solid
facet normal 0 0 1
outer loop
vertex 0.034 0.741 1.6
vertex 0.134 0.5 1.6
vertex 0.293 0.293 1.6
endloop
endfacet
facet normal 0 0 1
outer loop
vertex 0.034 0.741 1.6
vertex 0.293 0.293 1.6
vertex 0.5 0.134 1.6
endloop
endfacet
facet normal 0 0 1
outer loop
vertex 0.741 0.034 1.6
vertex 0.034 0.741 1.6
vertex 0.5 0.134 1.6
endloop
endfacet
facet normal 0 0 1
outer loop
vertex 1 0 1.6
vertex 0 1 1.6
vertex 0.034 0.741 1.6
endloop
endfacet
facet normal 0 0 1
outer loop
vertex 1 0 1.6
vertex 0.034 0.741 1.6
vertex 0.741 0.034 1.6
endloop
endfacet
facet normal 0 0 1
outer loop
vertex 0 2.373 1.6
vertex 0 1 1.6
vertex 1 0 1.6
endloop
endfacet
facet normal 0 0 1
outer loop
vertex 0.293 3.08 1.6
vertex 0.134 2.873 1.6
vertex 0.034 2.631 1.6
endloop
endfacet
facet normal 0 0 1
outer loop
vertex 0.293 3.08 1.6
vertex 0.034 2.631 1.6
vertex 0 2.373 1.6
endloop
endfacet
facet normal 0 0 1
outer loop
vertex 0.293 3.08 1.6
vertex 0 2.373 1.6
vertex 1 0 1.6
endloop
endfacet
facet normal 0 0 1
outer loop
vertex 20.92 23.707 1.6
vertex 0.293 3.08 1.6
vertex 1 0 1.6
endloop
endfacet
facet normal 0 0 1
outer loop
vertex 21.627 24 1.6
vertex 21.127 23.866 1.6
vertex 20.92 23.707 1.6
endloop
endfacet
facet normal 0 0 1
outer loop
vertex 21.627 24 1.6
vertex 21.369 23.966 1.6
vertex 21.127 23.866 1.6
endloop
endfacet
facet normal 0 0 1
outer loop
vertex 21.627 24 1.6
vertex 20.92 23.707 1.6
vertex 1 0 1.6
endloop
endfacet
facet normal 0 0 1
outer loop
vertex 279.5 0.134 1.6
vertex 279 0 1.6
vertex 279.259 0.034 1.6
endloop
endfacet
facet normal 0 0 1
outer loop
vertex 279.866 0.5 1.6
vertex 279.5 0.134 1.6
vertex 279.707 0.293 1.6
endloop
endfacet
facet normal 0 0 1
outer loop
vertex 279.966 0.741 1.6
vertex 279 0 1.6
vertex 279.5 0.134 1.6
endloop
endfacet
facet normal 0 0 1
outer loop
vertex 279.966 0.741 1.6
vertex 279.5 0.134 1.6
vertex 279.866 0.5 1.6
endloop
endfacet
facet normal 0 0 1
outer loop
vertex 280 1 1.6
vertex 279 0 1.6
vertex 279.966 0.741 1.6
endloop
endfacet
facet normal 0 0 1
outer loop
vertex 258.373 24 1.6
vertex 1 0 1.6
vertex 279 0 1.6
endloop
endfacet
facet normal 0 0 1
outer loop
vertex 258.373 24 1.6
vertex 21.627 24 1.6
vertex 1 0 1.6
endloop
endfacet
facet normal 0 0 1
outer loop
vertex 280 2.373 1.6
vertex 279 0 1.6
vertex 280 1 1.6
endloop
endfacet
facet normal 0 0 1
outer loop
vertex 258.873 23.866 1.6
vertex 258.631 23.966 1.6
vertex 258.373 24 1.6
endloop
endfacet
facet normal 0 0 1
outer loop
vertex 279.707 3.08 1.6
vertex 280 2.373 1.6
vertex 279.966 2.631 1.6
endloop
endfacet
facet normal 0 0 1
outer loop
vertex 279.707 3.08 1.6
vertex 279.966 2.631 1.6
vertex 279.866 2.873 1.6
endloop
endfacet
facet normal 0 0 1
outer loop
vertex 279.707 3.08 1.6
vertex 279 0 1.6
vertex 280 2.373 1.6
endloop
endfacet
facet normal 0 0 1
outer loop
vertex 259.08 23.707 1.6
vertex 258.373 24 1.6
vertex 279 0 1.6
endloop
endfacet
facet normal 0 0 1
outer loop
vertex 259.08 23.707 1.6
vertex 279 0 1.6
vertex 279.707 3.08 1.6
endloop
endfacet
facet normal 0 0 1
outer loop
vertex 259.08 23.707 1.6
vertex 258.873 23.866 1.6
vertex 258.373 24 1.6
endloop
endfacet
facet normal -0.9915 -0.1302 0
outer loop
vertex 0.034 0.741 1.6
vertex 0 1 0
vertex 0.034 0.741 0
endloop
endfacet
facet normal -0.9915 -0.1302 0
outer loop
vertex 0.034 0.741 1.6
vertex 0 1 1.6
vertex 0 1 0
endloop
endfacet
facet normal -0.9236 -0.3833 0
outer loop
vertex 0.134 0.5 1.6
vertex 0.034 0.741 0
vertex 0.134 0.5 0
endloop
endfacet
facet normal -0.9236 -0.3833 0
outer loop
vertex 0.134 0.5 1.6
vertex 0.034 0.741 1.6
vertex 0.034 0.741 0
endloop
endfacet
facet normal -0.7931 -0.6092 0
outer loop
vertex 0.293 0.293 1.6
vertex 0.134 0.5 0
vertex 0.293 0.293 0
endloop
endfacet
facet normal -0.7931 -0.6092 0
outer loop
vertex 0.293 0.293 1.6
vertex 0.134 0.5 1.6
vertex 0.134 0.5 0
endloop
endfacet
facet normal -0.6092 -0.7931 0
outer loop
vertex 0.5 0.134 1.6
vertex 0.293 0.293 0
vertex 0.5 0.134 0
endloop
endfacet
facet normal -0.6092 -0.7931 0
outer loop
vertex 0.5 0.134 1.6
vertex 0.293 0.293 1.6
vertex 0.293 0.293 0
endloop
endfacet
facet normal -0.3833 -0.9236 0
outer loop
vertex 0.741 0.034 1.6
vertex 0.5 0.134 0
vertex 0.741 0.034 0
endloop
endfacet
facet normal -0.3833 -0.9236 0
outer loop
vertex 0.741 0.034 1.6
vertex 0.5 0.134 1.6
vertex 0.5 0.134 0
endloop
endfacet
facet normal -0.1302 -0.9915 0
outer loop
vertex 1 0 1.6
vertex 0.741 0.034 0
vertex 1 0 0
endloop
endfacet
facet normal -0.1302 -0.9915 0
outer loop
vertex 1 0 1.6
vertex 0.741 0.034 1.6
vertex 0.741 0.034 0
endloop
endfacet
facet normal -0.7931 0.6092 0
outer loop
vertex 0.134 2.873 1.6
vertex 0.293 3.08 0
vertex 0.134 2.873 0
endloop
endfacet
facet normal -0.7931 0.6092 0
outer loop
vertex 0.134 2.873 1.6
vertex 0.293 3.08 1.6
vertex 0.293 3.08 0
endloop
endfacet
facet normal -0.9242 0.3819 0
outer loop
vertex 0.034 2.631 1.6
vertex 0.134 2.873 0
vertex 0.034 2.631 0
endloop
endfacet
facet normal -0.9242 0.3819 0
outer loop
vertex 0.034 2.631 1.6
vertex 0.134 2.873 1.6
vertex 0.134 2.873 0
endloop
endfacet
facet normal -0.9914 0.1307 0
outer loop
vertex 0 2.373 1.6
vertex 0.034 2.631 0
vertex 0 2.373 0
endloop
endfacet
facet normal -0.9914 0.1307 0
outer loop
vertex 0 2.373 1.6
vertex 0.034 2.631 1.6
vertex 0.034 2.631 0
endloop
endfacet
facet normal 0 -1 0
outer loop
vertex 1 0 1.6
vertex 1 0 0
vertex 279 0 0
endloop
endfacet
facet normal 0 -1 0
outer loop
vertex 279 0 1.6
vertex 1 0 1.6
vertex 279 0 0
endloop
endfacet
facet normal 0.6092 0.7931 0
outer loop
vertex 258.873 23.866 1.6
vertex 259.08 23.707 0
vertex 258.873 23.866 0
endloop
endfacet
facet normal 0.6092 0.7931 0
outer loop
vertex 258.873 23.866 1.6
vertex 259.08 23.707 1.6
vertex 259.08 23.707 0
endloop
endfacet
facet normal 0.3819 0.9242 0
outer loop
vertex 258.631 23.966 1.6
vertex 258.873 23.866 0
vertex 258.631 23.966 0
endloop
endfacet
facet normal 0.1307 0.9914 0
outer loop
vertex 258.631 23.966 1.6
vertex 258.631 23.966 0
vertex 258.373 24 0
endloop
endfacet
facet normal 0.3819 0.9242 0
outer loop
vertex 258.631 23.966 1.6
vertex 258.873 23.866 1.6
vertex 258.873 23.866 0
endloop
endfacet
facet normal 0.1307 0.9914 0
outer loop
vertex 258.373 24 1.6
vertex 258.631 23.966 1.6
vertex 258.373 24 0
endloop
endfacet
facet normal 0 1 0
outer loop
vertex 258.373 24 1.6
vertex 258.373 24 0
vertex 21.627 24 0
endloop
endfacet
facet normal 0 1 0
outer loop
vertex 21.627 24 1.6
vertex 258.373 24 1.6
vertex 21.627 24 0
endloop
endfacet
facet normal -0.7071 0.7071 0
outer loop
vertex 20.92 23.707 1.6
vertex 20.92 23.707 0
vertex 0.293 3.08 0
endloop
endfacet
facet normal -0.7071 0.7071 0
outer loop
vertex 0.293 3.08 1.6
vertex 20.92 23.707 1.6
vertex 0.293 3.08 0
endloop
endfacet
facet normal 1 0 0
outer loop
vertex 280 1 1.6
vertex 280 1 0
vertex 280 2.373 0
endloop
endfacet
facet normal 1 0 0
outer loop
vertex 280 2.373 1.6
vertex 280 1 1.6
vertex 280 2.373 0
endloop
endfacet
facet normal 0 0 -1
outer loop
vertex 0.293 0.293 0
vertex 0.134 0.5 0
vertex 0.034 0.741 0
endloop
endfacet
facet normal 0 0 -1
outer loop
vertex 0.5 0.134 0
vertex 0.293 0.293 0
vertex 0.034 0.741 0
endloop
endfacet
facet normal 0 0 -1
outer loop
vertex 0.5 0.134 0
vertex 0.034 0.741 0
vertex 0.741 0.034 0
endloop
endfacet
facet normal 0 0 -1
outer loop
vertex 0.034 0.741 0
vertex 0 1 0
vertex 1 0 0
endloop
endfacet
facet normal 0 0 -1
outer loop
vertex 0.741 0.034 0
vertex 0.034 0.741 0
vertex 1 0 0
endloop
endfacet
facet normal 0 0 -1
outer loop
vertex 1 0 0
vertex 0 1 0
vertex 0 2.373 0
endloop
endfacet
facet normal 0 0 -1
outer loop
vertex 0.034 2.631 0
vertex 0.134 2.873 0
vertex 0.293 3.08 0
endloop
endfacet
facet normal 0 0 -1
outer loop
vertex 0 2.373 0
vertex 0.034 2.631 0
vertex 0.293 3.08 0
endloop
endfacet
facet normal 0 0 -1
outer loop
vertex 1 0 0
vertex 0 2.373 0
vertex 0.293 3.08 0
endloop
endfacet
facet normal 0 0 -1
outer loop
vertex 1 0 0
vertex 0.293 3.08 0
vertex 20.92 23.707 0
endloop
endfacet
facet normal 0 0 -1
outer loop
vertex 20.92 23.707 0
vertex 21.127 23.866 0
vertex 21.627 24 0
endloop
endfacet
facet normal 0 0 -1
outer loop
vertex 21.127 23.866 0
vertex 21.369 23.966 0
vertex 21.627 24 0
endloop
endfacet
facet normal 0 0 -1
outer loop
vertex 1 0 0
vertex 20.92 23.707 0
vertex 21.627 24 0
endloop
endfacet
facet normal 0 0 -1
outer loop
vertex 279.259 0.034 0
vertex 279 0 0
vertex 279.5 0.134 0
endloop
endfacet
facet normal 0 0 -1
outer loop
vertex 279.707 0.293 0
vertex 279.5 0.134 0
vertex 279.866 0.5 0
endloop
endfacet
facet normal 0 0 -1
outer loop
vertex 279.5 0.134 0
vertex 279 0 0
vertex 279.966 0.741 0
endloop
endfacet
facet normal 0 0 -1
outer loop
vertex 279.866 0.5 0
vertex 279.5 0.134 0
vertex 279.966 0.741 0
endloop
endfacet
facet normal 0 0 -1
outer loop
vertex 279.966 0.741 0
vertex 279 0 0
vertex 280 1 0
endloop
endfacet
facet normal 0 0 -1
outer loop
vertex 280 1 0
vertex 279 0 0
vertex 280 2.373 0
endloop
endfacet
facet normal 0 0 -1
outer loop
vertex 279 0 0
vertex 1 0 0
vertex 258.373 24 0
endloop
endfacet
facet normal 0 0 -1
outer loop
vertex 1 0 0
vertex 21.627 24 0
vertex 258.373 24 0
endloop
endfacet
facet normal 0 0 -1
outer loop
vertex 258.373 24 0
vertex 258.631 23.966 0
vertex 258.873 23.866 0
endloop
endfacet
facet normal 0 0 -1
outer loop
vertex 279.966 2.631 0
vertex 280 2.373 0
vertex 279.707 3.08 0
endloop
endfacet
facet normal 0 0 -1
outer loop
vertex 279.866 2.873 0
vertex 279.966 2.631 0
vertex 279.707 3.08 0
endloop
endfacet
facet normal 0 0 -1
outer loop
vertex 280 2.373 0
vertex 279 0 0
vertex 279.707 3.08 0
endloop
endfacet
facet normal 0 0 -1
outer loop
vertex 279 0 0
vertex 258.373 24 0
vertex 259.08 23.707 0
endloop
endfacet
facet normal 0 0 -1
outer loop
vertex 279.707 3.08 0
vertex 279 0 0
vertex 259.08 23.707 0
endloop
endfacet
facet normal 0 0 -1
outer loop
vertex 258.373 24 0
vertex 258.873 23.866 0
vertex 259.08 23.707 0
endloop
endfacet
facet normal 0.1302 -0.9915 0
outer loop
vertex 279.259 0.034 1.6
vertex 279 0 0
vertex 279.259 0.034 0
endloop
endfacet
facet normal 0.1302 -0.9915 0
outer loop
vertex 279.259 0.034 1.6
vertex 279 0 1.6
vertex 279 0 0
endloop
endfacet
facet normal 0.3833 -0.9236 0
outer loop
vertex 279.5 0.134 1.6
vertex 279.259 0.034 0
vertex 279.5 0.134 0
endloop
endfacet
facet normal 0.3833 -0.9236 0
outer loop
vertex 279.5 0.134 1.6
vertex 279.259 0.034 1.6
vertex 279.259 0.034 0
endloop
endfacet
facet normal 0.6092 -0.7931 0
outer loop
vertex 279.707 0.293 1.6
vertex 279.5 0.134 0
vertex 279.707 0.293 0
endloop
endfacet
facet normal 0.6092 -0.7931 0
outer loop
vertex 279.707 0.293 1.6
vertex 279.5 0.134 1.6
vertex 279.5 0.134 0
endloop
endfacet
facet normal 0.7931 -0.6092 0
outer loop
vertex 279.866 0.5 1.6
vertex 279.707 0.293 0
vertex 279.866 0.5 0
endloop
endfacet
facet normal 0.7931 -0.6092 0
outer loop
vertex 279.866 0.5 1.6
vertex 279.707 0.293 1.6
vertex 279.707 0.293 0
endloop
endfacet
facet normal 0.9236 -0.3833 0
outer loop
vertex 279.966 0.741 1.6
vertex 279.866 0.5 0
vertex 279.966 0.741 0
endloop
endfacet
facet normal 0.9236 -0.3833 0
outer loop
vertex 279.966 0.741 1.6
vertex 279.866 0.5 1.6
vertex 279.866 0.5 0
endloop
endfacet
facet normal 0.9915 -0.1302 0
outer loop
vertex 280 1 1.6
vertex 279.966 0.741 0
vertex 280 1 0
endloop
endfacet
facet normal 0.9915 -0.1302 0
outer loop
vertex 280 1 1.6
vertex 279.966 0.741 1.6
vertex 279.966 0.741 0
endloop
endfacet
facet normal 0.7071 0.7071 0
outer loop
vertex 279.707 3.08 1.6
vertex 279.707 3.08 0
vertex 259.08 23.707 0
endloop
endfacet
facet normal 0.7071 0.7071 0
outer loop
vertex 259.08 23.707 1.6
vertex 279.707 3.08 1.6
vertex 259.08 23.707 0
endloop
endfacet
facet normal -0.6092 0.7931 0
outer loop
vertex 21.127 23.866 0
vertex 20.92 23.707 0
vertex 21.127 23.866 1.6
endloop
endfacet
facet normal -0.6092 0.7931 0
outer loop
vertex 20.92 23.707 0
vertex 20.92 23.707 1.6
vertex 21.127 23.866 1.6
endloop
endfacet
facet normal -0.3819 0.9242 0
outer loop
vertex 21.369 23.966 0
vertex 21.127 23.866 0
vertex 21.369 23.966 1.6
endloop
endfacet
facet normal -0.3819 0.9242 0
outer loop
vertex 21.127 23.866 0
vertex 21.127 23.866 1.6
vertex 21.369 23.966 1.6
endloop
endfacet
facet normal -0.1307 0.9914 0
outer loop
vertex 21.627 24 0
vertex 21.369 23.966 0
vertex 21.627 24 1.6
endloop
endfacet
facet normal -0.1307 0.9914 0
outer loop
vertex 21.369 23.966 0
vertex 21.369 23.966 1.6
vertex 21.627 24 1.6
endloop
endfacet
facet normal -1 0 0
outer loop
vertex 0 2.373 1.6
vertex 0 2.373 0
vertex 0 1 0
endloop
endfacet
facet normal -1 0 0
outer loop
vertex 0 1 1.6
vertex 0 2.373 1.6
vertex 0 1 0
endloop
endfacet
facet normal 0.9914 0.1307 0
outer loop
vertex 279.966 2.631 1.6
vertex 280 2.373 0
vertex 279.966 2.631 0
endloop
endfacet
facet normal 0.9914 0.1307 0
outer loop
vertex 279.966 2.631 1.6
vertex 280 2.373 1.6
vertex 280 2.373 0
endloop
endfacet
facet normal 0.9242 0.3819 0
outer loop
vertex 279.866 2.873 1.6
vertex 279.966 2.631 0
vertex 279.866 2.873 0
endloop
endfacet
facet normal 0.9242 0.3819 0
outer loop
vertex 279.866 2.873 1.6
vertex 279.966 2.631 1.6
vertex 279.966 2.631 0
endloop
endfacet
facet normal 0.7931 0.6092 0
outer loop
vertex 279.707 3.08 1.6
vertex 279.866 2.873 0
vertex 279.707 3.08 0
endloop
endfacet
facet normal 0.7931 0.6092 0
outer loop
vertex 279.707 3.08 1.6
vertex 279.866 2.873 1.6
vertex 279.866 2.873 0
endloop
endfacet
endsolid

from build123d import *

# Parameters (mm, degrees)
BOSS_EXTRUDE1_DEPTH = 1.6
FILLET1_R           = 1
BOSS_EXTRUDE2_DEPTH = 1.6


with BuildPart() as part:
    # Sketch1 → Boss-Extrude1 (new body)
    with BuildSketch(Plane.XY):
        with BuildLine():
            Line((21.213203436, 24), (0, 2.786796564))
            Line((0, 2.786796564), (0, 0))
            Line((0, 0), (42, 0))
            Line((42, 0), (42, 11))
            ThreePointArc((42, 11), (43.171572875, 13.828427125), (46, 15))
            Line((46, 15), (234, 15))
            ThreePointArc((234, 15), (236.828427125, 13.828427125), (238, 11))
            Line((238, 11), (238, 0))
            Line((238, 0), (280, 0))
            Line((280, 0), (280, 2.786796564))
            Line((280, 2.786796564), (258.786796564, 24))
            Line((258.786796564, 24), (21.213203436, 24))
        make_face()
    extrude(amount=BOSS_EXTRUDE1_DEPTH)

    # Fillet1
    fillet1_edges = [part.edges().sort_by_distance(p)[0] for p in [
        (0, 0, 0.8),
        (0, 2.786796564, 0.8),
        (21.213203436, 24, 0.8),
        (258.786796564, 24, 0.8),
        (280, 2.786796564, 0.8),
        (280, 0, 0.8),
    ]]
    fillet(fillet1_edges, radius=FILLET1_R)

    # Sketch1<3> → Boss-Extrude2 (add)
    with BuildSketch(Plane.XY):
        with BuildLine():
            Line((42, 11), (42, 0))
            Line((42, 0), (238, 0))
            Line((238, 0), (238, 11))
            ThreePointArc((238, 11), (236.828427125, 13.828427125), (234, 15))
            Line((234, 15), (46, 15))
            ThreePointArc((46, 15), (43.171572875, 13.828427125), (42, 11))
        make_face()
    extrude(amount=BOSS_EXTRUDE2_DEPTH)


solid = part.part
